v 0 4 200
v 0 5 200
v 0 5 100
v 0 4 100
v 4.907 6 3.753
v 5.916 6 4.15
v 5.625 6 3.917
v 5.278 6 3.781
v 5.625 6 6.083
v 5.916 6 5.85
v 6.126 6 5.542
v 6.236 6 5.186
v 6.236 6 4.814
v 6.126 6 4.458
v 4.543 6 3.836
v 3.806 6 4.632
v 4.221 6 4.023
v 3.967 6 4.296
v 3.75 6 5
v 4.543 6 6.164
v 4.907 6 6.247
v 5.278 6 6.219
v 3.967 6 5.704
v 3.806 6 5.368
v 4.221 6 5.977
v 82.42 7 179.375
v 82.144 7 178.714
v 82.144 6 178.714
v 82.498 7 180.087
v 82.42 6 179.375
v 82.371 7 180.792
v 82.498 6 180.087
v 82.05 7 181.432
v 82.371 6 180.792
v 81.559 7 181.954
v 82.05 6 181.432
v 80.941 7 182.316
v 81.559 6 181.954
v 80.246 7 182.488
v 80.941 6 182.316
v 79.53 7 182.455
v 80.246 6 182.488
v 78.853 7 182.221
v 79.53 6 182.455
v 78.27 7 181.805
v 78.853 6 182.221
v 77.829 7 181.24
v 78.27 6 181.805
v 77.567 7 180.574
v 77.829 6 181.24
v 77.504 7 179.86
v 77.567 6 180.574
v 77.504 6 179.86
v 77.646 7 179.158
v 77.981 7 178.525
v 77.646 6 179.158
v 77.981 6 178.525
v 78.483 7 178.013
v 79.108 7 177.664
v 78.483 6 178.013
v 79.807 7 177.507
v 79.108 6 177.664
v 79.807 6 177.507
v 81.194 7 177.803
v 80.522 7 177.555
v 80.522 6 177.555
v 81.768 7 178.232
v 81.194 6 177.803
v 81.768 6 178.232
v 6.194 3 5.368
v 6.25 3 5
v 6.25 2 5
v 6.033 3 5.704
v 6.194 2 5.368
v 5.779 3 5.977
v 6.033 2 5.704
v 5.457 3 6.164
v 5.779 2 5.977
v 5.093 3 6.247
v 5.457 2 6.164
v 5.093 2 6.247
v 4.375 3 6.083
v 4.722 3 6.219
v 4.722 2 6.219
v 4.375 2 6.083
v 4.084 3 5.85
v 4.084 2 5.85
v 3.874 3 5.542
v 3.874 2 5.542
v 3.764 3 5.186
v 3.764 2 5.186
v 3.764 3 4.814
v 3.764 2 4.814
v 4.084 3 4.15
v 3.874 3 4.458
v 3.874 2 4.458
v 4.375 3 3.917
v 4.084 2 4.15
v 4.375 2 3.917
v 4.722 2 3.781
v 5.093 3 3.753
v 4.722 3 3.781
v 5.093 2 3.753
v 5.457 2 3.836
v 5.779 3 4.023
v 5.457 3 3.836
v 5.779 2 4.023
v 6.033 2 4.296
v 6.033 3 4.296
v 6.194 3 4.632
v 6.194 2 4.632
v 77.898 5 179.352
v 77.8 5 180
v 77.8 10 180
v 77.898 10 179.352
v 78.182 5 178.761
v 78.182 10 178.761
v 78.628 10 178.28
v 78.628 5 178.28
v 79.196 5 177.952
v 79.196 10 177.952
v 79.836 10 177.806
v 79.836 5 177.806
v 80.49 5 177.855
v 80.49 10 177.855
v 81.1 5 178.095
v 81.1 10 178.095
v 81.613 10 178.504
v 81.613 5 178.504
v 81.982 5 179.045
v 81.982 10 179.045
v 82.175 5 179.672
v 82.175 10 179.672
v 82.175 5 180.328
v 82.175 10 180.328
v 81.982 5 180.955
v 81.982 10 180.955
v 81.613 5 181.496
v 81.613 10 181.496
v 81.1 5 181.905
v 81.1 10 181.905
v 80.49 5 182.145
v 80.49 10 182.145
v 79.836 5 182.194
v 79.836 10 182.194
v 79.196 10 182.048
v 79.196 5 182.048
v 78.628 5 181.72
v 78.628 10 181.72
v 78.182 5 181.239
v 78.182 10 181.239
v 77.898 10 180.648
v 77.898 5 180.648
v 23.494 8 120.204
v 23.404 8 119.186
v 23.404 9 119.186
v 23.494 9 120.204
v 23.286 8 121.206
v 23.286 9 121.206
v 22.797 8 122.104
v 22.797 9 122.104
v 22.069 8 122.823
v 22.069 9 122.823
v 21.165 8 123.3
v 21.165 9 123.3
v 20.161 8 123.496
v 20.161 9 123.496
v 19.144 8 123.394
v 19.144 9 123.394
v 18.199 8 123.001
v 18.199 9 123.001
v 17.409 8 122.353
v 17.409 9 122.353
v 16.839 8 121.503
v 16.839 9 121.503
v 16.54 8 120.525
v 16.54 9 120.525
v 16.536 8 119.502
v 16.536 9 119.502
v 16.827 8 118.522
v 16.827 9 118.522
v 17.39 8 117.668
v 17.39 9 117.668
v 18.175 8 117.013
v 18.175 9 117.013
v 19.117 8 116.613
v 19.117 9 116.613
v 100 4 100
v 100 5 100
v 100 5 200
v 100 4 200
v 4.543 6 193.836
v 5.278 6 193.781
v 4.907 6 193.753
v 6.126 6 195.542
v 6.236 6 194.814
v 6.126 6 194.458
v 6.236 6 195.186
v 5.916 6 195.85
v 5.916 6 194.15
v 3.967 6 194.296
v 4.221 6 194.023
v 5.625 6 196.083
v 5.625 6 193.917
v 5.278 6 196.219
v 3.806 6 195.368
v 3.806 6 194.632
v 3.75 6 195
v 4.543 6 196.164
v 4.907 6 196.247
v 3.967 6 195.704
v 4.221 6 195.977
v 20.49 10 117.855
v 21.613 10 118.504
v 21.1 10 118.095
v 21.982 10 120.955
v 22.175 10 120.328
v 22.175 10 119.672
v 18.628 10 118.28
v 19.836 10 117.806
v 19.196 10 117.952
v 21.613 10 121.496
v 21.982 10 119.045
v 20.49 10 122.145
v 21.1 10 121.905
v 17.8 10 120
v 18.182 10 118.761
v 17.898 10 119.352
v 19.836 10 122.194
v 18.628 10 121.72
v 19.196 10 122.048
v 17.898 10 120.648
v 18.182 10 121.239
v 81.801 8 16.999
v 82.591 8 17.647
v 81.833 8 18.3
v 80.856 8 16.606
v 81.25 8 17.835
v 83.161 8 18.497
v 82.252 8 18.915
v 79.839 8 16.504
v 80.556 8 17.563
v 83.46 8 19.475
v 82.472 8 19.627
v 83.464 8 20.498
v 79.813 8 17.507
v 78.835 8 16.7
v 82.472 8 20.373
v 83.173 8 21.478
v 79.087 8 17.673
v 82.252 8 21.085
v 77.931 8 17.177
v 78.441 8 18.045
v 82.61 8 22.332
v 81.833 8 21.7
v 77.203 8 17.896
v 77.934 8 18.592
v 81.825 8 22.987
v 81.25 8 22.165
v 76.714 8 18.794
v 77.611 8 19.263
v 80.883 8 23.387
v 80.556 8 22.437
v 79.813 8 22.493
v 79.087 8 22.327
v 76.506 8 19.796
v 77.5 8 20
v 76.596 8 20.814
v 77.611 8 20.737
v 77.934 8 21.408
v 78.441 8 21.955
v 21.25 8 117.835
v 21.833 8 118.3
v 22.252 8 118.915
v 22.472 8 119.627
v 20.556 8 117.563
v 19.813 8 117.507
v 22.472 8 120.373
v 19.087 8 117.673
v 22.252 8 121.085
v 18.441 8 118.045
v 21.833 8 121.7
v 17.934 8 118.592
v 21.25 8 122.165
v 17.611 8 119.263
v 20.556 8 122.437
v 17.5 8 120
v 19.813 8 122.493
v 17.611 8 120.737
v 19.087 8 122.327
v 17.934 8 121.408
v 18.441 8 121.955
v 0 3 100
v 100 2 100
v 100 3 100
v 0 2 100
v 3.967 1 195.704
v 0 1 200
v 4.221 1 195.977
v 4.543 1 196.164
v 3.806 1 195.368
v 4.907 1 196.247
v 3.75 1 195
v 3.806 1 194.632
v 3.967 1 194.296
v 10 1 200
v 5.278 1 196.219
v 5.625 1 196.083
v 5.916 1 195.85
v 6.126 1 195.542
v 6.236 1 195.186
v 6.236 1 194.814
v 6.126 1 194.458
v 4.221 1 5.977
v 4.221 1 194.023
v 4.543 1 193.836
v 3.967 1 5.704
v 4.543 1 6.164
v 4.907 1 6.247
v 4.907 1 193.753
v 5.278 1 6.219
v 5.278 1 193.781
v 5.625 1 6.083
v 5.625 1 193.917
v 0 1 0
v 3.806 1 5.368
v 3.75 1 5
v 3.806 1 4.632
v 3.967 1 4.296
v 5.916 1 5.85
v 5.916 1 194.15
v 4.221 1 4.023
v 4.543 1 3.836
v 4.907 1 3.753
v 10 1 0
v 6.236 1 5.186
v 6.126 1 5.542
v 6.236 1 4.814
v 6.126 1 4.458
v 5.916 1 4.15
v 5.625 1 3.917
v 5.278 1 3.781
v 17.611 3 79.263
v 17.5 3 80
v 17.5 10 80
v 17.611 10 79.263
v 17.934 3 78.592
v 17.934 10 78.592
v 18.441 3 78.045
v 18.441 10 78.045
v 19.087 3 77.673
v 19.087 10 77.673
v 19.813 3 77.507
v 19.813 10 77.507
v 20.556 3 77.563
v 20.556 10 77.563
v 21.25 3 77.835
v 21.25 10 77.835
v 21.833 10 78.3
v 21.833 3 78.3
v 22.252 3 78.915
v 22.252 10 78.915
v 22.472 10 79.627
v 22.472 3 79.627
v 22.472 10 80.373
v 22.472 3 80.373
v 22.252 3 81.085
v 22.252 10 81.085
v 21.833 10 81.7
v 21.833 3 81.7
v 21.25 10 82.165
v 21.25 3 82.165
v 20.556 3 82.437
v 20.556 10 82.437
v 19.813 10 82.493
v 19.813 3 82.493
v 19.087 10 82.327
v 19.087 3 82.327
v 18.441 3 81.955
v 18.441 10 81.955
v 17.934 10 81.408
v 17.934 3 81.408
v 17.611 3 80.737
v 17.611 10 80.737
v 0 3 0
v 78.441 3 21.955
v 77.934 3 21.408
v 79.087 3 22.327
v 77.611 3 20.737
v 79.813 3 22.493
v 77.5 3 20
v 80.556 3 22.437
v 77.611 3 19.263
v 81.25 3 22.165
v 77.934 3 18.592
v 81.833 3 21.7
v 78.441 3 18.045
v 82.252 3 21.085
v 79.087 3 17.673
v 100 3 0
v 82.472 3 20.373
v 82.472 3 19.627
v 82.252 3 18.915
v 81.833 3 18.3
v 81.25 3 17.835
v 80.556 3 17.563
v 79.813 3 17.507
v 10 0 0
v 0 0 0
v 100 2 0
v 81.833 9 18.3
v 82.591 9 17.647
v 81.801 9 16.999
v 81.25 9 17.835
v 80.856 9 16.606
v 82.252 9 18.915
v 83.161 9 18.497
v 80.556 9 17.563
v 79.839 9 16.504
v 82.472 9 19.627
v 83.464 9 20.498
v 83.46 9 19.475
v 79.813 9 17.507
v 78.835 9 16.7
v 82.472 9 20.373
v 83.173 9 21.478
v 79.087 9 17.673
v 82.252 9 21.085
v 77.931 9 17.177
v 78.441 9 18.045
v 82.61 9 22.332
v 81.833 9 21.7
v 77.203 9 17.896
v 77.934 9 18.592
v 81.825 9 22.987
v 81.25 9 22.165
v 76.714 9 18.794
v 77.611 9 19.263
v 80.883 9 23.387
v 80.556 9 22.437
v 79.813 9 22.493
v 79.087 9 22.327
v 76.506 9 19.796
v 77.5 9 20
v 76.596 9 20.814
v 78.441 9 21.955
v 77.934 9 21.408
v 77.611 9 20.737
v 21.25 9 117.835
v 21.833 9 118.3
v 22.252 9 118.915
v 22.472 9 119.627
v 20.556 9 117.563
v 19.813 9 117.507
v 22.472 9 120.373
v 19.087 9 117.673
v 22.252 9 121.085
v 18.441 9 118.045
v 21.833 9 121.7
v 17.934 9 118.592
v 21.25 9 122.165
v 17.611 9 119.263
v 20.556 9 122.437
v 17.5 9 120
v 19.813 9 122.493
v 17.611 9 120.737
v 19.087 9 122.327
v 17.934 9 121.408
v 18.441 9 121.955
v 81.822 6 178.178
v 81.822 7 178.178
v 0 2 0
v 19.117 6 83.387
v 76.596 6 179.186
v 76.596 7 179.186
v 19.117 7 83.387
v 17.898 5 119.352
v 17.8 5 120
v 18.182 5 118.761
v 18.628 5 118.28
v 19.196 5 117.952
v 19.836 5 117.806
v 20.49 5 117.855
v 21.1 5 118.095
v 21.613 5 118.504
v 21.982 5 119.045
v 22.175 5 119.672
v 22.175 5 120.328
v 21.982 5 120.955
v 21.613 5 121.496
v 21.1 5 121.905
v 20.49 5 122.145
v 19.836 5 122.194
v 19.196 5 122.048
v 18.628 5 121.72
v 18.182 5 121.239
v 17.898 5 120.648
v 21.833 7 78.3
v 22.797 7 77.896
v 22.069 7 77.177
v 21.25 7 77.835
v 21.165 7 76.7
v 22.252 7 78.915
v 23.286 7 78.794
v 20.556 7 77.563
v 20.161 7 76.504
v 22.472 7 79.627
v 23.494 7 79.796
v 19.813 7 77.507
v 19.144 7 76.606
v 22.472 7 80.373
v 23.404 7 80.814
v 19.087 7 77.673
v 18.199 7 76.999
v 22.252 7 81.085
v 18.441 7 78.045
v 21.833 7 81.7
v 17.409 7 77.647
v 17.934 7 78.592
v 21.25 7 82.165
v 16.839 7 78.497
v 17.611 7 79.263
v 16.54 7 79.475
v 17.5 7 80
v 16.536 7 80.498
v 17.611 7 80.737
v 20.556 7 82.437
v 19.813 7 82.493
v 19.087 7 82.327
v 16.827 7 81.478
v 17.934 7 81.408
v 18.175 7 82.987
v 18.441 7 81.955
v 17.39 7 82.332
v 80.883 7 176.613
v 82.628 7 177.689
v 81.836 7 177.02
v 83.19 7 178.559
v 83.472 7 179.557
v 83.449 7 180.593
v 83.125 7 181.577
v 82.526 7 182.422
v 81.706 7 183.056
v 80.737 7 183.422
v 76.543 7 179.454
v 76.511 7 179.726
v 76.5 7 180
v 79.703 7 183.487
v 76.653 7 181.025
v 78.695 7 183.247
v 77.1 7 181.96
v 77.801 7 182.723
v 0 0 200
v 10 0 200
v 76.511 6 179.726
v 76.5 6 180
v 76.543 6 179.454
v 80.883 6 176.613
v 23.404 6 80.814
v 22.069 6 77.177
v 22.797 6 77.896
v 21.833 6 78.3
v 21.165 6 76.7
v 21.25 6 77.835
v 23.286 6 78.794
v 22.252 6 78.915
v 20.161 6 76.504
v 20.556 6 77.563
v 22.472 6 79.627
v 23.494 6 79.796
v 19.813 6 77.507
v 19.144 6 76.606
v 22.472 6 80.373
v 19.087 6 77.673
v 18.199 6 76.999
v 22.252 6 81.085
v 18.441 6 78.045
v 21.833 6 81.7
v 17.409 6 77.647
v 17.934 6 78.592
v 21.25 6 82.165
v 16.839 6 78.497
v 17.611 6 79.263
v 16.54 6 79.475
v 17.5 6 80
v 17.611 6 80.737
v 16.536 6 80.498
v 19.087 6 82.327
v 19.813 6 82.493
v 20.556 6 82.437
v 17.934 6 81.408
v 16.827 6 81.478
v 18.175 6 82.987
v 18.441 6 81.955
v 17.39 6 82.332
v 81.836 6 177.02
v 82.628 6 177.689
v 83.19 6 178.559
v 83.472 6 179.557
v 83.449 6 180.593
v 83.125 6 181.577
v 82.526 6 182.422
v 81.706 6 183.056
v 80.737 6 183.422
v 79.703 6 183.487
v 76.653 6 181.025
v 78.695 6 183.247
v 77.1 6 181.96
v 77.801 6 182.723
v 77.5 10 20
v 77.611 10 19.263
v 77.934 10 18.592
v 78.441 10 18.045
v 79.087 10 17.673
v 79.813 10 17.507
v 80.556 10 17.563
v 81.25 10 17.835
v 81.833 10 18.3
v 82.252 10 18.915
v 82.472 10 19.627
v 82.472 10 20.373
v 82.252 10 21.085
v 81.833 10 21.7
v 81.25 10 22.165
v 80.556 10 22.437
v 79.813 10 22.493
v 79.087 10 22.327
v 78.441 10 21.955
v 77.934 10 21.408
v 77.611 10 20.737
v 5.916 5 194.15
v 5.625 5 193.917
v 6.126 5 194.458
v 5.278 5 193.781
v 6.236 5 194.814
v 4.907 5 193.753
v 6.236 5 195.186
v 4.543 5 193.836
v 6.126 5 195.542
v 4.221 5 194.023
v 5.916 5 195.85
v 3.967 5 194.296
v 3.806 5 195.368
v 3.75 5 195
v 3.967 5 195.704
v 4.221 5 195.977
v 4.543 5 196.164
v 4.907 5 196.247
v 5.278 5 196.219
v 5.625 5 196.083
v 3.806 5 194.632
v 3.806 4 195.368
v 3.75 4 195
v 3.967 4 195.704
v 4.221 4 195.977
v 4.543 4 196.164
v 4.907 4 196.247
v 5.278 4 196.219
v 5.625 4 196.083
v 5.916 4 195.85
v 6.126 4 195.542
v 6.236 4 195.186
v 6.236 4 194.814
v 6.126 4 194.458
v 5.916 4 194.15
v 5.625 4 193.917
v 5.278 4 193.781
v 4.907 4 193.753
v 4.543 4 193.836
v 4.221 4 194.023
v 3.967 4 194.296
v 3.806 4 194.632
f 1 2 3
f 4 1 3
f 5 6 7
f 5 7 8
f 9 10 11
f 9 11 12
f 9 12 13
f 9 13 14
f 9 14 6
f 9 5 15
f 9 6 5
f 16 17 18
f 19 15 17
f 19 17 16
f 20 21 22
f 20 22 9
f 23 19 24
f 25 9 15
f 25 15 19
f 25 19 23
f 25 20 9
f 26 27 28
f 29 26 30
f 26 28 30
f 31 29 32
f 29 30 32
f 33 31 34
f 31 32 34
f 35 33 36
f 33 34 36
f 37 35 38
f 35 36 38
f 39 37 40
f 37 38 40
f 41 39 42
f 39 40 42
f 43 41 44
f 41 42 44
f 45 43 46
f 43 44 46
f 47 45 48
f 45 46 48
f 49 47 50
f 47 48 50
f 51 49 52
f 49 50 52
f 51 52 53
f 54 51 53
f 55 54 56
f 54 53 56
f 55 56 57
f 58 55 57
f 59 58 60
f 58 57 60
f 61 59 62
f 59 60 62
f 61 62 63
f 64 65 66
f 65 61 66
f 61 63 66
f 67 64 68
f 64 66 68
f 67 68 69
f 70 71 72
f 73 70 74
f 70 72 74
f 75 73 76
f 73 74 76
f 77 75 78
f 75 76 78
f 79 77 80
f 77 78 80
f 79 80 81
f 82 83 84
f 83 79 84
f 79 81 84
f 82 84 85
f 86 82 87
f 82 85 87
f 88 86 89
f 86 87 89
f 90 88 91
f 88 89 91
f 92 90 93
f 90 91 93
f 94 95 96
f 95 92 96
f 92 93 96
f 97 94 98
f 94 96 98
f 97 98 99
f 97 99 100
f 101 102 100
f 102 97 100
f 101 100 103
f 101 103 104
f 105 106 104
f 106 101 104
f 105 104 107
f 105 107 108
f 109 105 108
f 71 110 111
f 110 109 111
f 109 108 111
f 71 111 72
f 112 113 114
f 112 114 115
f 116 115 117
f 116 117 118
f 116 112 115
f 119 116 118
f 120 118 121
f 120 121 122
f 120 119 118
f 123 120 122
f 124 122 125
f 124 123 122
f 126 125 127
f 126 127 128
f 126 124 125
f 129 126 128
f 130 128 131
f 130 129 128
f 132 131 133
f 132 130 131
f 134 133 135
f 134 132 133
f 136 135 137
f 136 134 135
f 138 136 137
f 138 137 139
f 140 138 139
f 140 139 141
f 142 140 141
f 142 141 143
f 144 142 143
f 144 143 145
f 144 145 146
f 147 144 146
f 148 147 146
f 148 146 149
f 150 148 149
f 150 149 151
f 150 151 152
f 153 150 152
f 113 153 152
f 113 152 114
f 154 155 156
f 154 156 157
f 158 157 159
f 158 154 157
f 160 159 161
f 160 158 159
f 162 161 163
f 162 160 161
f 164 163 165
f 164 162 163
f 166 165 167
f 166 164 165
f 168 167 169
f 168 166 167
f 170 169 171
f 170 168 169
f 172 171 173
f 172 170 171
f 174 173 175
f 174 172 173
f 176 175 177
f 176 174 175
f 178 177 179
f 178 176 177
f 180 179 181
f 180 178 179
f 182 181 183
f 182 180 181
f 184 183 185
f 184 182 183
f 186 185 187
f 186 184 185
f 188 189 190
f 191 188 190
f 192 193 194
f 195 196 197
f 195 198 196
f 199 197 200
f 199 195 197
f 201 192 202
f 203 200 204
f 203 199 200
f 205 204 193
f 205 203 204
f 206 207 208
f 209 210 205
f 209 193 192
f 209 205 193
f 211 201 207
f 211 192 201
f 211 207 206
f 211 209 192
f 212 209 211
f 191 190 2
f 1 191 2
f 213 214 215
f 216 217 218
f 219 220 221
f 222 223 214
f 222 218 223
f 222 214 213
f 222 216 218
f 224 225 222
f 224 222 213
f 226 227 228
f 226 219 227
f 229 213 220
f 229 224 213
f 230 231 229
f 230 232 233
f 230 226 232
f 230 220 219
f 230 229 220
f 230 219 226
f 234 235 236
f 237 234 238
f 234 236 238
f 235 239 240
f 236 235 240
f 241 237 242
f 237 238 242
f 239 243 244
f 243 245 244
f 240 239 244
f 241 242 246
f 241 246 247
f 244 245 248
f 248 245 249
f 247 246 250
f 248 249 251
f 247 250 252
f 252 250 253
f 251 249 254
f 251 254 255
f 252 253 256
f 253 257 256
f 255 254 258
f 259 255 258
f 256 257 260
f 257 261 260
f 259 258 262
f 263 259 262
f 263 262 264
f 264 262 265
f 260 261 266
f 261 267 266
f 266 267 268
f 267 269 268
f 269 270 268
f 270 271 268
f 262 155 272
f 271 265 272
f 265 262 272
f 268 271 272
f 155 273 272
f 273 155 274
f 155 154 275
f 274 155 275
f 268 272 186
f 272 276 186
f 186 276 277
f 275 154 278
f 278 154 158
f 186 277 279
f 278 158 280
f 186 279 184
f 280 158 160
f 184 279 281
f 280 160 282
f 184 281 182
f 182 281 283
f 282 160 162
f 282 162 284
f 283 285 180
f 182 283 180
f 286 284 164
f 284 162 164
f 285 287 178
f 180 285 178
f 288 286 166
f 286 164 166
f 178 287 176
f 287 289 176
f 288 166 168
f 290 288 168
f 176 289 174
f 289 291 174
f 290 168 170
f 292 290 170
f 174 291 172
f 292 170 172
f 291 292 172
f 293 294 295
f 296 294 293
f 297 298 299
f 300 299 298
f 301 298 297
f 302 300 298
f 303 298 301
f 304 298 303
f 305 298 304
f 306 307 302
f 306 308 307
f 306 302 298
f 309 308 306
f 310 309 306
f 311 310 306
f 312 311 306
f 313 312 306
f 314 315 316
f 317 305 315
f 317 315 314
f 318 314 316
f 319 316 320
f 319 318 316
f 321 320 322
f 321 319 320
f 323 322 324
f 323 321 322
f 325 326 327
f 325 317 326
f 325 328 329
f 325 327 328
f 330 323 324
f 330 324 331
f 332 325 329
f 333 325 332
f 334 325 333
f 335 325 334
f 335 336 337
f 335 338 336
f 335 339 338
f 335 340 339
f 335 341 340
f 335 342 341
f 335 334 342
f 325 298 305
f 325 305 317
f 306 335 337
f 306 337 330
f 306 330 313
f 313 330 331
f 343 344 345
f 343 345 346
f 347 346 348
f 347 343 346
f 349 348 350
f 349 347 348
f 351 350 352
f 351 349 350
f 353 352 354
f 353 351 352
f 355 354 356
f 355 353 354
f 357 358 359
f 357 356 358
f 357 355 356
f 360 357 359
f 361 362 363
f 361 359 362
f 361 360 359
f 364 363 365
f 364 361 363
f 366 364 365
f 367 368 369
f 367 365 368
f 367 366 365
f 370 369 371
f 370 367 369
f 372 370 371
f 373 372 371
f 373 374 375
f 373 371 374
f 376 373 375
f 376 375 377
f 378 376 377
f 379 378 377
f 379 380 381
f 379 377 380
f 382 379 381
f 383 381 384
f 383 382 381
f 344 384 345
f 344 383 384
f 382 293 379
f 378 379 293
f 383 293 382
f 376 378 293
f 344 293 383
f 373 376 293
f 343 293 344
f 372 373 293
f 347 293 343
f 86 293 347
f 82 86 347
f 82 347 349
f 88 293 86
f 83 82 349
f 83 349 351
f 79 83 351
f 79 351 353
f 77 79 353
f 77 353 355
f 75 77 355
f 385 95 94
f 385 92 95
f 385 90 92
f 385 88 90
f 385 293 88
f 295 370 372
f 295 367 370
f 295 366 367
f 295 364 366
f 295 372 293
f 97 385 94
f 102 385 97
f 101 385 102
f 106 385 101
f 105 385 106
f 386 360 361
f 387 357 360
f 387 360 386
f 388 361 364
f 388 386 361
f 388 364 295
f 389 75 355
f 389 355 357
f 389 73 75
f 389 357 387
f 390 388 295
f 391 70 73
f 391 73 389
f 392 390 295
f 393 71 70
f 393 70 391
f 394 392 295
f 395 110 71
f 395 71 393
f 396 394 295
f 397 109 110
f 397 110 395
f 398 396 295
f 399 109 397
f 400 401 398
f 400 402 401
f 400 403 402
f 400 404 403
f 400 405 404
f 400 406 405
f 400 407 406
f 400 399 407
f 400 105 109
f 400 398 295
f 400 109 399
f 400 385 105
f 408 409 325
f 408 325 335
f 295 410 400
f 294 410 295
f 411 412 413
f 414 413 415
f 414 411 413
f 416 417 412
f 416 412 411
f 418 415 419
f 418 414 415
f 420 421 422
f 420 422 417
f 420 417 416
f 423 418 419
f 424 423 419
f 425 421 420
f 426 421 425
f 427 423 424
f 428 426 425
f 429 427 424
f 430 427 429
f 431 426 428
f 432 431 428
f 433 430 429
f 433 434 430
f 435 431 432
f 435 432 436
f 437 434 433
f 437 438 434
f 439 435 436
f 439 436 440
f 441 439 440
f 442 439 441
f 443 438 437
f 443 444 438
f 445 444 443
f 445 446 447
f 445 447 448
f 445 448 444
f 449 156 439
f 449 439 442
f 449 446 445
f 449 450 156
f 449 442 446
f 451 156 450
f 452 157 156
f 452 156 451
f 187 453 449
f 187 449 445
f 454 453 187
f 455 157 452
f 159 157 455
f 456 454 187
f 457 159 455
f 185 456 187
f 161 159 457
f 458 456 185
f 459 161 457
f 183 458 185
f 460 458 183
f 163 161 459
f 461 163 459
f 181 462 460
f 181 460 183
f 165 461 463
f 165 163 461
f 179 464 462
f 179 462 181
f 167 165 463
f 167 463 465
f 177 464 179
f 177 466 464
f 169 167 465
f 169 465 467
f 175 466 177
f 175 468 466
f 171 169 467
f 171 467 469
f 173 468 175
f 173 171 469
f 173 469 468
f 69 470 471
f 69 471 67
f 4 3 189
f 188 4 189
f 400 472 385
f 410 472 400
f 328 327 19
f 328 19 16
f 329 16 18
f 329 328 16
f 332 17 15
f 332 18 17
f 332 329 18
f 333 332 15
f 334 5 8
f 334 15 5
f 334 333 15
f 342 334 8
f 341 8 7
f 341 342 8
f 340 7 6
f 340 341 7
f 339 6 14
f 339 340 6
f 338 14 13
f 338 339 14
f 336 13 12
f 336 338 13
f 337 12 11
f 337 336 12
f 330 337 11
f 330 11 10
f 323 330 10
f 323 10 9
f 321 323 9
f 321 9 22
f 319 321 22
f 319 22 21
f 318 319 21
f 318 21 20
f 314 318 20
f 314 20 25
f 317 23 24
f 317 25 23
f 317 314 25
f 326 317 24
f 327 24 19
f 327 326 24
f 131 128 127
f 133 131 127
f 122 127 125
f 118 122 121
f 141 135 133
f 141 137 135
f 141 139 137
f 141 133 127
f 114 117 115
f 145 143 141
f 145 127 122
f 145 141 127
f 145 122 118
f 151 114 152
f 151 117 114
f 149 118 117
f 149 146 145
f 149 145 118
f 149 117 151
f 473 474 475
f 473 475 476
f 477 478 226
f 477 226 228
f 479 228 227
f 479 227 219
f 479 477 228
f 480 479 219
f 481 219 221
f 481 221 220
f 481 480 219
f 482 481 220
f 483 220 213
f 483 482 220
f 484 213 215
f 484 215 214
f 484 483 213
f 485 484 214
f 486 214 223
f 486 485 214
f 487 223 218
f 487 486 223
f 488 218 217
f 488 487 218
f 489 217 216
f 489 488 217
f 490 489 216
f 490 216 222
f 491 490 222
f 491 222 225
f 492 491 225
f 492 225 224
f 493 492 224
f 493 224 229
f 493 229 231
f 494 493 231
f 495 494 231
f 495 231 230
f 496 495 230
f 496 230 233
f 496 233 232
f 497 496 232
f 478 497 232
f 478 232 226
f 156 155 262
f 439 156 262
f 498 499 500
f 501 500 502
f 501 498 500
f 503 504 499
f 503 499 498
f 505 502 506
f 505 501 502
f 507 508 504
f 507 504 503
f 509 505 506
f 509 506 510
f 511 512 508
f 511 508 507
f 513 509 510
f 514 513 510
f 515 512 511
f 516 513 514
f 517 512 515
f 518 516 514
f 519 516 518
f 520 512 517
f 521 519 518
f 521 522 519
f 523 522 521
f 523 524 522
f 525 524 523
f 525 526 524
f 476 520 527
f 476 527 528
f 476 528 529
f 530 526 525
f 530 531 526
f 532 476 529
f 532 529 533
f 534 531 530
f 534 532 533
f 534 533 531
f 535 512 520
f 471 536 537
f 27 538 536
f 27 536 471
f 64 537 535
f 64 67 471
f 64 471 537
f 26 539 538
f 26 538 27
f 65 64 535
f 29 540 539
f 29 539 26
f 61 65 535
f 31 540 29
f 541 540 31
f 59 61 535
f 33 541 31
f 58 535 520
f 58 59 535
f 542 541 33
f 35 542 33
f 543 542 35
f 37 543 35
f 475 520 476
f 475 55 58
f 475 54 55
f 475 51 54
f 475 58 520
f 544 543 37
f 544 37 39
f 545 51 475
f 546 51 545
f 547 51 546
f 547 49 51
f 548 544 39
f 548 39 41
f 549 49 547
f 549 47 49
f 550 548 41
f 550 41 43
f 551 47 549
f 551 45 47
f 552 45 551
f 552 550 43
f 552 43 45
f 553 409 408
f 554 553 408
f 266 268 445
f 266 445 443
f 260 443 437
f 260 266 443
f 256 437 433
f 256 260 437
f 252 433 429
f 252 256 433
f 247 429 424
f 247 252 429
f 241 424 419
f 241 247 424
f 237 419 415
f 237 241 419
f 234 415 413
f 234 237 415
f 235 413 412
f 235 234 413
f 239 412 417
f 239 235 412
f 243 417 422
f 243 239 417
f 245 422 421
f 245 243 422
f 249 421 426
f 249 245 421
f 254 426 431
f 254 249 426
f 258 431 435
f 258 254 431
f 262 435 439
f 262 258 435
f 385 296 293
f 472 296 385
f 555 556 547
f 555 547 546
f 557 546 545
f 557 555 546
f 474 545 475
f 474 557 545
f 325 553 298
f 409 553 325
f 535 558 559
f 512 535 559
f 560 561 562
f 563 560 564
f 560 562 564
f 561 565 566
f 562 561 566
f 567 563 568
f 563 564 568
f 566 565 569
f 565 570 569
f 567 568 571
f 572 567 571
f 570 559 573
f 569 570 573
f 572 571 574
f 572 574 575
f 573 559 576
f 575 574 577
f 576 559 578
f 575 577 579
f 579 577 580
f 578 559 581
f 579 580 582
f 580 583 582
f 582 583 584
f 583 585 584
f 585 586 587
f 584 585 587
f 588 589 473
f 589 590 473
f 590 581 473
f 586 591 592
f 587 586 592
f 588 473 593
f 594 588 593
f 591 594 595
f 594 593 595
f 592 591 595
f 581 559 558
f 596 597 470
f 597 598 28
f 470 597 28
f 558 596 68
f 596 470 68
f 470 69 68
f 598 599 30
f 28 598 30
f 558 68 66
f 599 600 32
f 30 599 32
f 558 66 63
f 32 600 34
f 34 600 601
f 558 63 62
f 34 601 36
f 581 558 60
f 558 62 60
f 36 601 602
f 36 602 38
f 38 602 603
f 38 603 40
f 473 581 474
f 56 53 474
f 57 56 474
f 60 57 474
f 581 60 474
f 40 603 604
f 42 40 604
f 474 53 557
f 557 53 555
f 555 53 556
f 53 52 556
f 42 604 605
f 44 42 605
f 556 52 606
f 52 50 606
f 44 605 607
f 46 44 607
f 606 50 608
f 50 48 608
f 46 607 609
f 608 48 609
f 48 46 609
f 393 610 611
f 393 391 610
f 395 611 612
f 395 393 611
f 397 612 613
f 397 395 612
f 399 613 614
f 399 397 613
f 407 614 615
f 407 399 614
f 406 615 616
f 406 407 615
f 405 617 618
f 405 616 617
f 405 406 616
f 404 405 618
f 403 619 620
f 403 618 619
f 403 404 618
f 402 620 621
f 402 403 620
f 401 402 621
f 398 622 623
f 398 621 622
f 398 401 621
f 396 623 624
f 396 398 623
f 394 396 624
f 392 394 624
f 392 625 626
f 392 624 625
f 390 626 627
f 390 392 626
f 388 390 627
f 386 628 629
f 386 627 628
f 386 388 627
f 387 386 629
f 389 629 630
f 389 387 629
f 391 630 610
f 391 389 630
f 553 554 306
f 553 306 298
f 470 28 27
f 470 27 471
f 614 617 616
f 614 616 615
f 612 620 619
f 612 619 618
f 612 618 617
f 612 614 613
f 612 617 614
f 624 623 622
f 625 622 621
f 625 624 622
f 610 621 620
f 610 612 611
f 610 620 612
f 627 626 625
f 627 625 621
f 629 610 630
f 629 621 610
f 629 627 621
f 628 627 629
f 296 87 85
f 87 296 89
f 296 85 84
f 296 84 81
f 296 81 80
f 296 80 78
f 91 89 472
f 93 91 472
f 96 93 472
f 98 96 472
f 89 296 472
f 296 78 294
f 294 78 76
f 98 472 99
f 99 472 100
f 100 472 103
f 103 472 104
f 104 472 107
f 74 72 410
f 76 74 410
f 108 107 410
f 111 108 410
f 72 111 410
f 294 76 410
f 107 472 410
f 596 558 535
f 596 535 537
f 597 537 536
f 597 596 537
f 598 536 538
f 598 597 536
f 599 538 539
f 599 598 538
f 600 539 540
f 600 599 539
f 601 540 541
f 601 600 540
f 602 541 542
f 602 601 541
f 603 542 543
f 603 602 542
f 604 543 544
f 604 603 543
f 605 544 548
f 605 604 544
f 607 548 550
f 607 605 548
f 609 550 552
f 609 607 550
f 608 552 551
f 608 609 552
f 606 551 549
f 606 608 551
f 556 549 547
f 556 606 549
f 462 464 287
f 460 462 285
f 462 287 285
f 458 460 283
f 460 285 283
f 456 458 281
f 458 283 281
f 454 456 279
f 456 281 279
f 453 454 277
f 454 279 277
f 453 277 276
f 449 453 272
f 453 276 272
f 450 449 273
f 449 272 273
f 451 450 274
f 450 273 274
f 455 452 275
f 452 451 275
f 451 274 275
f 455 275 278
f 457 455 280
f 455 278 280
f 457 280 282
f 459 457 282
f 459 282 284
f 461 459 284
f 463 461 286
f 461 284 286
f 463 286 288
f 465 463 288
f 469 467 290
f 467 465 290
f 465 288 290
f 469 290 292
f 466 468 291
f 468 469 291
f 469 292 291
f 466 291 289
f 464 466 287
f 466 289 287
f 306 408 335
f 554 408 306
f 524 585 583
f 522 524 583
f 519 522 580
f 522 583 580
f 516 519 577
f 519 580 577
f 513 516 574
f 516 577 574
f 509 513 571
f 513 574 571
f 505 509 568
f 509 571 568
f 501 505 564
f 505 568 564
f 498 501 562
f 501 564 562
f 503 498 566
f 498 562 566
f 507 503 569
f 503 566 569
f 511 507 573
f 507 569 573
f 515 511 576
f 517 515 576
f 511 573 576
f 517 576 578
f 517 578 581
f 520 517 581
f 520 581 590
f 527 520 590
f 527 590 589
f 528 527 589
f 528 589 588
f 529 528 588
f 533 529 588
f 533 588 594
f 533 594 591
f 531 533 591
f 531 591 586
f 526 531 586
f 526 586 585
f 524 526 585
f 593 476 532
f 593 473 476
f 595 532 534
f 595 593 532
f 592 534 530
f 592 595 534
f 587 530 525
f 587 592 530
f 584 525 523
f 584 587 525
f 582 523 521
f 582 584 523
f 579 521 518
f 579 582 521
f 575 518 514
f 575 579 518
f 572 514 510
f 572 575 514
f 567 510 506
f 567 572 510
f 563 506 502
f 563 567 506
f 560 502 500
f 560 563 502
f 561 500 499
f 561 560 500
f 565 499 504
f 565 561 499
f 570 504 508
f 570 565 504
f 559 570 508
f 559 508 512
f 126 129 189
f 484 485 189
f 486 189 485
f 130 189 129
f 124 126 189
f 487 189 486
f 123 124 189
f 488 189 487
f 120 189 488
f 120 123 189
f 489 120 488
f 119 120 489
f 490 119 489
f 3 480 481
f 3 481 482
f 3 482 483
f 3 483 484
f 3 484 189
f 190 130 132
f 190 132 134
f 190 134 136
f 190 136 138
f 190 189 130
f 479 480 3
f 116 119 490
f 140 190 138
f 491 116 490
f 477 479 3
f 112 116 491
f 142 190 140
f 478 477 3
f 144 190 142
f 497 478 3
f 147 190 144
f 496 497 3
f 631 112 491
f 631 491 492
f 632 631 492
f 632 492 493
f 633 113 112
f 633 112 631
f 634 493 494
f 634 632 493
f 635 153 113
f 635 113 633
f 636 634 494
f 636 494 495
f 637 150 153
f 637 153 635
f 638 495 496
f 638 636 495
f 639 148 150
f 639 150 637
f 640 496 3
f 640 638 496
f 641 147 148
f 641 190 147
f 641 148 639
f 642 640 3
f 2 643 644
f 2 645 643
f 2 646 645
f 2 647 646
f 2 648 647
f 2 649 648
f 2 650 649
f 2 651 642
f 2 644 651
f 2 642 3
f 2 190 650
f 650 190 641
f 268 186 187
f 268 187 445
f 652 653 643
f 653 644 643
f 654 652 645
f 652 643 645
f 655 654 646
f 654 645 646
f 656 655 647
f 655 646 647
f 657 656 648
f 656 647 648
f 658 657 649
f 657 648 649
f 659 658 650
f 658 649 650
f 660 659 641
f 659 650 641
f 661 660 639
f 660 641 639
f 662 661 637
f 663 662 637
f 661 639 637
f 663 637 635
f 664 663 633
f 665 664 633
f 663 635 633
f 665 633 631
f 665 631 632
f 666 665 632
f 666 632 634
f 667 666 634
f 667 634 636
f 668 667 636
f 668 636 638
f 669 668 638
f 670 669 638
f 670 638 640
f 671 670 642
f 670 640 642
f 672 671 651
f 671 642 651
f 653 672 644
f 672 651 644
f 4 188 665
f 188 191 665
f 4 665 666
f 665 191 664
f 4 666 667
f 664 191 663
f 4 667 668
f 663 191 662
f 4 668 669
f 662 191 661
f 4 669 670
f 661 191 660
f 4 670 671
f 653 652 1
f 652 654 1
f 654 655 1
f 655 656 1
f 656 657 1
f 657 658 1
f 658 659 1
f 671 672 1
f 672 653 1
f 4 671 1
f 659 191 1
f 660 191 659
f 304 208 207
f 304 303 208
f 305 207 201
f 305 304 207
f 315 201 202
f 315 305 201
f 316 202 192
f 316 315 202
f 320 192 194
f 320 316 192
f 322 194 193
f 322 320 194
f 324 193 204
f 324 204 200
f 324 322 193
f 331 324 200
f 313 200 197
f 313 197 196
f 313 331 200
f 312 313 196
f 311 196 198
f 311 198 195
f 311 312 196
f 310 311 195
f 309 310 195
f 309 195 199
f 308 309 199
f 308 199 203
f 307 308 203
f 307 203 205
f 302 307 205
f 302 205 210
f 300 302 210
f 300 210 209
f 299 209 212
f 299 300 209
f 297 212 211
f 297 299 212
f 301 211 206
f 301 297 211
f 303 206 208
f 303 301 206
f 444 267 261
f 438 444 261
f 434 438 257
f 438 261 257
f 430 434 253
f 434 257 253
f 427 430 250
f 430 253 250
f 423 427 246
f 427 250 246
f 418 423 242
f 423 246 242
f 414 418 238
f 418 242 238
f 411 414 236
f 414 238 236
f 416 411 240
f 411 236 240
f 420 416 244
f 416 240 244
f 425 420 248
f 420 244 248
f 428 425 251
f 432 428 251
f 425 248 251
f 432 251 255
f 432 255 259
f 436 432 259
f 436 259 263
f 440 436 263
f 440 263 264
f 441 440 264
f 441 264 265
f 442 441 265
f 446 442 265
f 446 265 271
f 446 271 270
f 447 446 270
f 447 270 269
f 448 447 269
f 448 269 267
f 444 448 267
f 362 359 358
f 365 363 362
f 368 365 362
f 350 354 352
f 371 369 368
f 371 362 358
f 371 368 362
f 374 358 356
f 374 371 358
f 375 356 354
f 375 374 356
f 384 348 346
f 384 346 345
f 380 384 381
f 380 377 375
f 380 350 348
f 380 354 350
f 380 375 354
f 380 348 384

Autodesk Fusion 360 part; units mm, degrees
sketch "frame" plane through (0, 0, 0) normal (0, 1, 0) x (1, 0, 0) in component "frame"
  line L0 (0, 0) -> (10, 0)
  line L1 (10, 0) -> (10, -200)
  line L2 (10, -200) -> (0, -200)
  line L3 (0, -200) -> (0, 0)
  dimension "d1" = 10
  dimension "d2" = 200
extrude "Extrude1" add sketch "frame" along normal blind 1 makes body 1 in component "frame"
sketch "frame pins" plane through (0, 1, 0) normal (0, 1, 0) x (-1, 0, 0) in component "frame"
  line L0 (0, 200) -> (-10, 200)
  line L1 (-10, 200) -> (-10, 0)
  line L2 (-10, 0) -> (0, 0)
  line L3 (0, 0) -> (0, 200)
  circle A0 centre (-5, 5) radius 1.25
  line L4 (-10, 0) -> (0, 0)
  line L5 (0, 0) -> (0, 10)
  line L6 (0, 10) -> (-10, 10)
  line L7 (-10, 10) -> (-10, 0)
  line L8 (-10, 200) -> (0, 200)
  line L9 (0, 200) -> (0, 190)
  line L10 (0, 190) -> (-10, 190)
  line L11 (-10, 190) -> (-10, 200)
  line L12 (-10, 200) -> (0, 190)
  circle A1 centre (-5, 195) radius 1.25
  dimension "d5" = 2.5
  dimension "d6" = 2.5
extrude "Extrude2" add sketch "frame pins" along normal blind 5 contours L12 A1 | L12 A1 | A0 bodies 1 in component "frame"
sketch "lower door" plane through (0, 0, 0) normal (0, 1, 0) x (1, 0, 0) in component "lower door"
  line L0 (0, 0) -> (100, 0)
  line L1 (100, 0) -> (100, -100)
  line L2 (100, -100) -> (0, -100)
  line L3 (0, -100) -> (0, 0)
  line L4 (10, -10) -> (0, -10)
  line L5 (0, -10) -> (0, 0)
  line L6 (0, 0) -> (10, 0)
  line L7 (10, 0) -> (10, -10)
  line L8 (10, -10) -> (0, 0)
  circle A0 centre (5, -5) radius 1.25
  dimension "d9" = 100
  dimension "d10" = 100
  dimension "d11" = 2.5
extrude "Extrude1'" add sketch "lower door" along normal blind 3 and the other way blind -2 separate body contours L3 L4 L5 L8 A0 | L0 L6 L7 L8 A0 | L0 L1 L2 L3 L4 L7 makes body 2 in component "lower door"
sketch "upper door" plane through (0, 6, 0) normal (0, 1, 0) x (-1, 0, 0) in component "upper_door"
  circle A0 centre (-5, 5) radius 1.25
  line L0 (-100, 200) -> (0, 200)
  line L1 (0, 200) -> (0, 100)
  line L2 (0, 100) -> (-100, 100)
  line L3 (-100, 100) -> (-100, 200)
  line L4 (0, 200) -> (-10, 200)
  line L5 (-10, 200) -> (-10, 190)
  line L6 (-10, 190) -> (0, 190)
  line L7 (0, 190) -> (0, 200)
  line L8 (-10, 200) -> (0, 190)
  circle A1 centre (-5, 195) radius 1.25
  dimension "d16" = 2.5
extrude "Extrude1''" add sketch "upper door" along normal blind -2 and the other way blind 1 separate body contours L0 L1 L2 L3 L5 L6 | L5 L6 L8 A1 | L0 L1 L4 L7 L8 A1 makes body 3 in component "upper_door"
sketch "lower door pins" plane through (0, 3, 0) normal (0, 1, 0) x (-1, 0, 0) in component "lower door"
  circle A0 centre (-5, 5) radius 1.25
  line L0 (0, 0) -> (0, 100)
  line L1 (0, 100) -> (-100, 100)
  line L2 (-100, 100) -> (-100, 0)
  line L3 (-100, 0) -> (0, 0)
  line L4 (-100, 0) -> (-60, 0)
  line L5 (-60, 0) -> (-60, 40)
  line L6 (-60, 40) -> (-100, 40)
  line L7 (-100, 40) -> (-100, 0)
  circle A1 centre (-80, 20) radius 2.5
  line L8 (0, 100) -> (-40, 100)
  line L9 (-40, 100) -> (-40, 60)
  line L10 (-40, 60) -> (0, 60)
  line L11 (0, 60) -> (0, 100)
  circle A2 centre (-20, 80) radius 2.5
  dimension "d21" = 40
  dimension "d22" = 40
  dimension "d23" = 5
  dimension "d24" = 40
  dimension "d25" = 40
  dimension "d26" = 5
extrude "Extrude2'" add sketch "lower door pins" along normal blind 7 contours A1 | A2 bodies 2 in component "lower door"
sketch "upper door pins" plane through (0, 5, 0) normal (0, 1, 0) x (-1, 0, 0) in component "upper_door"
  circle A0 centre (-5, 195) radius 1.25
  line L0 (0, 100) -> (0, 200)
  line L1 (0, 200) -> (-100, 200)
  line L2 (-100, 200) -> (-100, 100)
  line L3 (-100, 100) -> (0, 100)
  line L4 (-100, 200) -> (-60, 200)
  line L5 (-60, 200) -> (-60, 160)
  line L6 (-60, 160) -> (-100, 160)
  line L7 (-100, 160) -> (-100, 200)
  line L8 (0, 100) -> (-40, 100)
  line L9 (-40, 100) -> (-40, 140)
  line L10 (-40, 140) -> (0, 140)
  line L11 (0, 140) -> (0, 100)
  circle A1 centre (-80, 180) radius 2.5
  circle A2 centre (-20, 120) radius 2.5
  dimension "d29" = 40
  dimension "d30" = 40
  dimension "d31" = 40
  dimension "d32" = 40
  dimension "d33" = 5
  dimension "d34" = 5
extrude "Extrude2''" add sketch "upper door pins" along normal blind 5 contours A1 | A2 bodies 3 in component "upper_door"
sketch "rod" plane through (0, 5, 0) normal (0, 1, 0) x (-1, 0, 0) in component "first_rod"
  circle A0 centre (-80, 180) radius 2.5
  circle A1 centre (-20, 120) radius 2.5
  circle A2 centre (-5, 195) radius 1.25
  line L0 (0, 100) -> (0, 200)
  line L1 (0, 200) -> (-100, 200)
  line L2 (-100, 200) -> (-100, 100)
  line L3 (-100, 100) -> (0, 100)
  line L4 (-100, 200) -> (-60, 200)
  line L5 (-60, 200) -> (-60, 160)
  line L6 (-60, 160) -> (-100, 160)
  line L7 (-100, 160) -> (-100, 200)
  line L8 (0, 100) -> (-40, 100)
  line L9 (-100, 160) -> (-60, 200)
  circle A3 centre (-80, 180) radius 2.5
  line L10 (-40, 100) -> (0, 100)
  line L11 (0, 100) -> (0, 60)
  line L12 (0, 60) -> (-40, 60)
  line L13 (-40, 60) -> (-40, 100)
  line L14 (-40, 100) -> (0, 60)
  circle A4 centre (-20, 80) radius 2.5
  line L15 (-20, 80) -> (-18.2322, 81.7678)
  line L16 (-82.1437, 178.7138) -> (-22.1437, 78.7138)
  line L17 (-77.8563, 181.2862) -> (-17.8563, 81.2862)
  circle A5 centre (-80, 180) radius 3.5
  circle A6 centre (-20, 80) radius 3.5
  line L18 (-80, 180) -> (-32, 100)
  line L19 (-21.8007, 83.0012) -> (-20, 80)
  dimension "d37" = 40
  dimension "d38" = 40
  dimension "d39" = 40
  dimension "d41" = 40
  dimension "d42" = 40
  dimension "d43" = 5
  dimension "d46" = 1
  dimension "d47" = 1
extrude "Extrude1'''" add sketch "rod" along normal blind 2 and the other way blind -1 separate body contours A0 A3 L17 A5 L18 | A0 L9 A3 L17 A5 | A0 L9 A3 L16 A5 L18 | A0 L9 A3 L16 A5 | L6 L17 A5 L18 | L6 L16 A5 L18 | L3 L6 L8 L10 L17 L18 | L9 L16 A5 | L3 L6 L8 L10 L16 L18 | L3 L8 L10 L14 L16 L17 A6 | L14 A4 L17 A6 | A4 L17 A6 L19 | L14 A4 A6 L19 | L14 L16 A6 | L14 A4 L16 A6 | L14 A4 L16 A6 makes body 4 in component "first_rod"
move_face "OffsetFaces1" offset -0.3 2 faces at (22.3492, 8.3333, 119.1449) (77.5773, 8.3333, 180.6169) on bodies 3 in component "upper_door"
sketch "rod (2)" plane through (0, 5, 0) normal (0, 1, 0) x (-1, 0, 0) in component "second_rod"
  circle A0 centre (-80, 180) radius 2.2
  circle A1 centre (-20, 120) radius 2.2
  circle A2 centre (-5, 195) radius 1.25
  line L0 (0, 100) -> (0, 200)
  line L1 (0, 200) -> (-100, 200)
  line L2 (-100, 200) -> (-100, 100)
  line L3 (-100, 100) -> (0, 100)
  line L4 (0, 100) -> (-40, 100)
  line L5 (-40, 100) -> (-40, 140)
  line L6 (-40, 140) -> (0, 140)
  line L7 (0, 140) -> (0, 100)
  line L8 (-100, 0) -> (-60, 0)
  line L9 (-60, 0) -> (-60, 40)
  line L10 (-60, 40) -> (-100, 40)
  line L11 (-100, 40) -> (-100, 0)
  circle A3 centre (-80, 20) radius 2.5
  circle A4 centre (-20, 120) radius 2.5
  line L12 (-20, 120) -> (-80, 20)
  line L13 (-22.1437, 121.2862) -> (-82.1437, 21.2862)
  line L14 (-17.8563, 118.7138) -> (-77.8563, 18.7138)
  circle A5 centre (-80, 20) radius 3.5
  circle A6 centre (-20, 120) radius 3.5
  dimension "d54" = 40
  dimension "d55" = 40
  dimension "d56" = 40
  dimension "d57" = 40
  dimension "d58" = 5
  dimension "d59" = 5
  dimension "d60" = 2.5
  dimension "d61" = -2.5
  dimension "d62" = 1
  dimension "d63" = 1
extrude "Extrude1''''" add sketch "rod (2)" along normal blind 4 and the other way blind -3 separate body contours A4 L12 L14 A6 | A4 L12 L13 A6 | A4 L13 L14 A6 | L3 L4 L12 L14 A6 | L3 L4 L12 L13 A6 | L3 L4 L10 L12 L13 | L3 L4 L10 L12 L14 | L10 L12 L13 A5 | L10 L12 L14 A5 | A3 L12 L14 A5 | A3 L12 L13 A5 | A3 L13 L14 A5 makes body 5 in component "second_rod"
component "frame" placed x (1, 0, 0) y (0, 1, 0) z (0, 0, 1) at (0, 0, 0)
component "lower door" placed x (1, 0, 0) y (0, 1, 0) z (0, 0, 1) at (0, 0, 0)
component "upper_door" placed x (1, 0, 0) y (0, 1, 0) z (0, 0, 1) at (0, 0, 0)
component "first_rod" placed x (1, 0, 0) y (0, 1, 0) z (0, 0, 1) at (0, 0, 0)
component "second_rod" placed x (1, 0, 0) y (0, 1, 0) z (0, 0, 1) at (0, 0, 0)
